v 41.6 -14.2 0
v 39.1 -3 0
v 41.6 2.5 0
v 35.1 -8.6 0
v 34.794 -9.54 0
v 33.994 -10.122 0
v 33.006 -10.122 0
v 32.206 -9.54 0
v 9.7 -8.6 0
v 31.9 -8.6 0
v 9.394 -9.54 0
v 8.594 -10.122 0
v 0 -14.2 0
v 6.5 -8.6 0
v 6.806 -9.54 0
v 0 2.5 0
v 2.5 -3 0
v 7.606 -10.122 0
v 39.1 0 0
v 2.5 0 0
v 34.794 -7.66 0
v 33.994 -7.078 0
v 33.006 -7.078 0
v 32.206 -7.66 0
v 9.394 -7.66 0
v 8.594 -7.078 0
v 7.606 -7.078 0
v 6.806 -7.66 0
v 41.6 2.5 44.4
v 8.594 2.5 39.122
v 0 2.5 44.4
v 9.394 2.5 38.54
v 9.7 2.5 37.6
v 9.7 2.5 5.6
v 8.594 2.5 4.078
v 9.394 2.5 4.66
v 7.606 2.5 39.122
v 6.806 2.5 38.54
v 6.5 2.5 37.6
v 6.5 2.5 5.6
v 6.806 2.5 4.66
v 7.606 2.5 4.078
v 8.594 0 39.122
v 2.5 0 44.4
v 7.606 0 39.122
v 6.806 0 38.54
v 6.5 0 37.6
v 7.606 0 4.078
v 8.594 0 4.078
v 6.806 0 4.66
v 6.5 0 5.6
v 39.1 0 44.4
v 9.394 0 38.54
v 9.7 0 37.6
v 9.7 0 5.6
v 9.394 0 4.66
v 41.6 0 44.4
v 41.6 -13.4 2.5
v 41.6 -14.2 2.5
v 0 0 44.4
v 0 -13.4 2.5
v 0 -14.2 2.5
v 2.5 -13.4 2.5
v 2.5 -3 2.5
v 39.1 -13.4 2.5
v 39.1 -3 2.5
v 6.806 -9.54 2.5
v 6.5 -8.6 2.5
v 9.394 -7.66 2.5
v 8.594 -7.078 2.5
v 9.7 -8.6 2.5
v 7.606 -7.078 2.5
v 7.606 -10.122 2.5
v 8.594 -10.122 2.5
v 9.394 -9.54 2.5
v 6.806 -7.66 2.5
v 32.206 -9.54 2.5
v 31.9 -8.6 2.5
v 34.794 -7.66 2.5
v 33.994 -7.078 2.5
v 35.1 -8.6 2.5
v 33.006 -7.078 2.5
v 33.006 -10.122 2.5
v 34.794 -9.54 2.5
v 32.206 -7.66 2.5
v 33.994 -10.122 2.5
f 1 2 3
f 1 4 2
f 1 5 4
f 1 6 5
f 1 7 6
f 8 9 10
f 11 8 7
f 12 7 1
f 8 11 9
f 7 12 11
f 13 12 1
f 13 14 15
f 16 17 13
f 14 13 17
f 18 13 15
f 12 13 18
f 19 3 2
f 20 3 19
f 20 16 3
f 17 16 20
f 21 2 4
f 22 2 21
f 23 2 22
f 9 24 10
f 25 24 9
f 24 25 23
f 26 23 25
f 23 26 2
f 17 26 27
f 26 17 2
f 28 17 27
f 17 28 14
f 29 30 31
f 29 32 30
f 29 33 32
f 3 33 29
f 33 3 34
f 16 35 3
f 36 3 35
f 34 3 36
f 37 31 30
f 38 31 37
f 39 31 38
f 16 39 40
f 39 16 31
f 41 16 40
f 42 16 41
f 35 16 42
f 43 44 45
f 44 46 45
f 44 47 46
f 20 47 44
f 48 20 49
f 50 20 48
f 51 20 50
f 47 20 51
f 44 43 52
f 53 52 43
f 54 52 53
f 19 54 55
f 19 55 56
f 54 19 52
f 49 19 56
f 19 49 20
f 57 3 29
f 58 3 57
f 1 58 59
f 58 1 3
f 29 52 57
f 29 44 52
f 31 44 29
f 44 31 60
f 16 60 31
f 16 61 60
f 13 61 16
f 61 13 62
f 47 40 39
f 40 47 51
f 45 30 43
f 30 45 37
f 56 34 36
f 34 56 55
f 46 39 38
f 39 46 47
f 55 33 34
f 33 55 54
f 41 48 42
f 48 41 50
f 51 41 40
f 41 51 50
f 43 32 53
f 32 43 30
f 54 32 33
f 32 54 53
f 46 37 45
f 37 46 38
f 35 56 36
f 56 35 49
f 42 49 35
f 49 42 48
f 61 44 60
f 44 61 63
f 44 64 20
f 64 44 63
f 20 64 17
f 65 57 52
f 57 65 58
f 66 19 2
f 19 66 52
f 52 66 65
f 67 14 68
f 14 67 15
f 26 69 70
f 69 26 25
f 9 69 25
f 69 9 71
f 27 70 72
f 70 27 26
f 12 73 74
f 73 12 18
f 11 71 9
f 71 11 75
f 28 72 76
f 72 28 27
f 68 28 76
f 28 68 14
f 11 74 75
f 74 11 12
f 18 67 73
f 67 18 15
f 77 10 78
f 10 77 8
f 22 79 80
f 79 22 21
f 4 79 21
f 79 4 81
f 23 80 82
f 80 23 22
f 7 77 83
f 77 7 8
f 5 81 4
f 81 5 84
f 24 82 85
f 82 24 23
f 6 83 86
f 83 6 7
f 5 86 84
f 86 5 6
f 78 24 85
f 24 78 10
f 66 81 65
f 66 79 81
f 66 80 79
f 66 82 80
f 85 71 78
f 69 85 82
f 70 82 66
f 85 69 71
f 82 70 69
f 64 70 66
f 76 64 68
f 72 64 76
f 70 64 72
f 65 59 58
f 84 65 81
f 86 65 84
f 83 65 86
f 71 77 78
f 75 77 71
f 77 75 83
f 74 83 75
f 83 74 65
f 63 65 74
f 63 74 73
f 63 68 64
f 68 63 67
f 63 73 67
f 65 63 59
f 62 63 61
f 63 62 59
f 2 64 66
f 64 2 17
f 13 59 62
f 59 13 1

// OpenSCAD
// Improved Parametric Mounting Bracket
// Original by Steve and Jacob Graber (grabercars)
// Modified by Bill Gertz (billgertz) on 4 June 2015
// Version 0.91
//
// Fixed:
// 0.91 - slotConfigOvr mod to virtualize pegboard option into modes
//
// Improved Parametric Mounting Bracket by billgertz is licensed under a Creative Commons Attribution-ShareAlike 4.0 International License.
// Based on a work at http://www.thingiverse.com/thing:29110.
//
// Code needs refactoring and generally has several hacks, if you wish to fix - enjoy!

slotConfig = 2;        // Configuration settings, integer value from 0-3. See Thingiverse page at http://www.thingiverse.com/thing:864034 for more info.

baseDepth = 2.5;       // Thickness of the base portion of the bracket
baseDiameter = 3.2;    // Diameter of base holes
baseAllowance = 4;     // Minimum distance between the base mounting holes and the edge. (Includes triangulation braces) May be glitchy for slotConfig = 0.
baseDistance = 3;      // Space between inner surface of bracket platform and side of mounting platform. 
                       // Set to zero if your slot height is high enough that the base will not interfere with the mounting bolts' heads.

slotDepth = 2.5;       // Thickness of the slot portion of the bracket.
vSlotLength = 32;      // Length/height of the vertical slot. Only applies to slotConfig = 2,3. 0 is a circular hole.
hSlotLength = 15;      // Length of the horizontal slot. Only applies to slotConfig = 1,3. 0 is a circular hole.
slotDiameter = 3.2;    // Diameter of slot holes
slotAllowance = 4;     // Minimum distance between slot side and any edge/obstruction (See baseDistance)
slotHeight = 4;        // The height off of the bottom of the bracket that the hole starts. Measured from bottom of hole.

supportWidth = 2.5;    // Width of triangular prisms that hold the base to the bracket

//////// Options for base holes, vertical slot supports, pegboard mounting and 1U height ////////

pegBoard = true;       // When true, the base mounting will be fixed for standard (even EU!) pegboard
baseSlot = false;      // If true, the base mounting point will be a slot rather than a double hole
bracketMirror = false; // Change to true if you would like the vertical slot on the other side (Only for slotConfig = 3, 6 and 7)
slotSupport = true;    // Change to true if you would like support to top of vertical slot
rack1U = true;         // Change to true if want a 1U bracket height

//////// Do not edit any of these variables below ////////

inchMetric = 25.4;   // Length of inch in mm
rack1uHeight = 44.4; // height of 1 rack unit equipment in mm

slotConfigOvr = pegBoard ? slotConfig + 4 : slotConfig;  // turn on internal pegboard modes for pegboard
baseSlotOvr = (slotConfigOvr == 0) || (slotConfigOvr == 2) || baseSlot; // override mode 0 and 2 for a base slot. For a perfect hole in mode 0 set:
                                                                        // baseAllowance = slotAllowance

pegBoardBaseLength = inchMetric+2*baseAllowance+2*supportWidth+baseDiameter; // calcualted length for pegboard

slotSupportLength = (slotConfigOvr % 4 > 1) && slotSupport ? vSlotLength : 0;   // set slot support length to full support if option 2,3,6 & 7 and support requested
adjSlotAllowance = rack1U && (slotConfigOvr % 4 > 1) &&
                   (slotHeight+slotDiameter+slotAllowance+slotSupportLength < rack1uHeight) ? 
                       rack1uHeight - (slotHeight+slotDiameter+slotSupportLength) : slotAllowance; // tweak top slot allowance to work out to 1U height if not already bigger than 1U
supportLength = slotHeight+slotDiameter+adjSlotAllowance+slotSupportLength;

baseLength = [2*supportWidth+2*slotAllowance+slotDiameter,               // slotConfig = 0
              2*supportWidth+2*slotAllowance+slotDiameter+hSlotLength,   // slotConfig = 1
              2*supportWidth+2*slotAllowance+slotDiameter,               // slotConfig = 2
              2*supportWidth+3*slotAllowance+2*slotDiameter+hSlotLength, // slotConfig = 3
              pegBoardBaseLength,                                        // slotConfig = 0 and pegBoard
              pegBoardBaseLength,                                        // slotConfig = 1 and pegBoard
              pegBoardBaseLength,                                        // slotConfig = 2 and pegBoard
              pegBoardBaseLength                                         // slotConfig = 3 and pegBoard
             ];

//////// Option checking, add new validation here ////////
// This is an ugly hack, working on a better error reporting mechanism,
//    unfortunately the OpenSCAD laguage itself seems to be a barrier.
//    Somebody prove me wrong, please.
//

optionWarningMode0 = (slotConfig == 0 || slotConfig == 2) && (baseAllowance != slotAllowance); //warn unless perfect hole configured
optionWarningTextMode0 = "Mode 0 or 2 selected - slot option turned on";

optionWarning1u = slotHeight+slotDiameter+slotAllowance+slotSupportLength > rack1uHeight;
optionWarningText1u = "Bracket height greater than 1U - not adjusted downward";

optionWarning1uHeight = rack1U && (slotConfig == 0 || slotConfig == 1);
optionWarningText1uHeight = "Mode 0 and 1 do support 1U height - not adjusted upward";

optionErrorBadMode = (slotConfig < 0) || (slotConfig > 3);
optionErrorTextBadMode = "Bad slot configuration mode, use 0 to 3 only";

optionErrorBaseHole = (baseLength[slotConfigOvr] - 2*(supportWidth+baseDiameter+baseAllowance) < 0) && !baseSlotOvr;
optionErrorTextBaseHole = "Base holes overlap or not enough clearance";

//////////////////

transVal = [
    supportWidth+slotAllowance+slotDiameter/2,
    0,
    supportWidth, 
    baseLength[slotConfigOvr]-(2*slotAllowance+slotDiameter)-supportWidth,
    supportWidth+slotAllowance+slotDiameter+hSlotLength,
    0,
    supportWidth, 
    supportWidth+slotAllowance+slotDiameter+hSlotLength,
    supportWidth+slotAllowance+slotDiameter+hSlotLength
]; // grabercars: Why can't I assign variable values in IF statements? (billgertz: because OpenSCAD is a macro expansion language with limitations)

polyPoi = [
    [0, 0, supportLength], 
    [supportWidth, 0, supportLength], 
    [supportWidth, 0, 0], 
    [0, 0, 0], 
    [0, -(baseDistance+2*baseAllowance+baseDiameter), 0], 
    [supportWidth, -(baseDistance+2*baseAllowance+baseDiameter), 0]
];

polyTri = [[0,3,2], [0,2,1],  [3,0,4], [1,2,5], [0,5,4], [0,1,5],  [5,2,4], [4,2,3], ]; // Thank you OpenSCAD User Manual! <3

//////////////////

module bracketMount(){
	module hSlotPositive(){
		if (slotConfigOvr % 4 == 0){
			cube([baseLength[slotConfigOvr],slotDepth,slotHeight+slotDiameter+slotAllowance]);
		}
		if (slotConfig % 4 != 0 && slotConfig % 4 != 2){
			cube([baseLength[slotConfigOvr],slotDepth,slotHeight+slotDiameter+slotAllowance]);
		} // Well that was boring
		if (slotConfigOvr % 4!= 0 && slotConfigOvr % 4 != 1){
			translate([transVal[slotConfigOvr], 0, 0]) union(){
				cube([2*slotAllowance+slotDiameter, slotDepth, slotHeight+slotDiameter/2+vSlotLength]);
				translate([slotAllowance+slotDiameter/2,slotDepth,slotHeight+slotDiameter/2+vSlotLength])
					rotate([90,0,0])
						cylinder(r=(slotAllowance+slotDiameter/2), h=slotDepth, $fn=20);
			}
			cube([baseLength[slotConfigOvr],slotDepth,supportLength]);
		} // If I said this unit wasn't partially guessing stuff I would be lying
	}
	module hSlotNegative(){
		if (slotConfigOvr % 4 == 0){
			translate([transVal[slotConfigOvr],slotDepth+1,slotHeight+slotDiameter/2])
			rotate([90,0,0]) 
				cylinder(r=slotDiameter/2, h=slotDepth+2, $fn=10);
		}
		if (slotConfigOvr % 4 != 0 && slotConfigOvr % 4 != 2){
			translate([slotAllowance+supportWidth+slotDiameter/2,slotDepth+1,slotHeight+slotDiameter/2])
			rotate([90,0,0]) 
				hull(){
					cylinder(r=slotDiameter/2, h=slotDepth+2, $fn=10);
					translate([hSlotLength,0,0])
						cylinder(r=slotDiameter/2, h=slotDepth+2, $fn=10);
				} // Hooray hulls! Making my life that much easier.
		}
		if (slotConfigOvr % 4 != 0 && slotConfigOvr % 4 != 1){
			translate([transVal[slotConfigOvr]+slotAllowance+slotDiameter/2,slotDepth+1,slotHeight+slotDiameter/2])
			rotate([90,0,0]) 
				hull(){
					cylinder(r=slotDiameter/2, h=slotDepth+2, $fn=10);
					translate([0,vSlotLength,0])
						cylinder(r=slotDiameter/2, h=slotDepth+2, $fn=10);
				}
		}
	}
	difference(){
		hSlotPositive();
		hSlotNegative();
	}
}

module triangularSupport(){
    polyhedron (points = polyPoi, triangles = polyTri);
    translate([baseLength[slotConfigOvr]-supportWidth,0,0])
        polyhedron (points = polyPoi, triangles = polyTri);
}

module baseMount(){
	module positiveBase(){
		translate([0,-baseDistance,0]) mirror([0,1,0])
			cube([baseLength[slotConfigOvr], 2*baseAllowance+baseDiameter, baseDepth]);
	}
	module negativeBase(){
		if (baseSlotOvr){
			translate([baseAllowance+supportWidth+baseDiameter/2,-baseDistance-baseAllowance-baseDiameter/2,-1]) hull(){
				cylinder(r=baseDiameter/2, h=baseDepth+2, $fn=10);
				translate([baseLength[slotConfigOvr]-2*baseAllowance-2*supportWidth-baseDiameter,0,0])
					cylinder(r=baseDiameter/2, h=baseDepth+2, $fn=10);
			}
		} else {
			translate([baseAllowance+supportWidth+baseDiameter/2,-baseDistance-baseAllowance-baseDiameter/2,-1]) union(){
				cylinder(r=baseDiameter/2, h=baseDepth+2, $fn=10);
				translate([baseLength[slotConfigOvr]-2*baseAllowance-2*supportWidth-baseDiameter,0,0])
					cylinder(r=baseDiameter/2, h=baseDepth+2, $fn=10);
			}
		}
	}
	difference(){
		positiveBase();
		negativeBase();
	}
}

if (optionErrorBadMode){
    echo(str("ERROR - ", optionErrorTextBadMode, " NO OBJECT GENERATED"));
} else {
    if (optionErrorBaseHole){
       echo(str("ERROR - ", optionErrorTextBaseHole, " NO OBJECT GENERATED"));
    } else { 
        if (optionWarning1u){ echo(str("WARNING - ", optionWarningText1u)); };
        if (optionWarning1uHeight){ echo(str("WARNING - ", optionWarningText1uHeight)); };
        if (optionWarningMode0){ echo(str("WARNING - ", optionWarningTextMode0)); };
    
        if (bracketMirror){
            mirror([1,0,0]){
                bracketMount();
                triangularSupport();
                baseMount();
            }
        } else {
            bracketMount();
            triangularSupport();
            baseMount();
        }
        
    }
    
}
